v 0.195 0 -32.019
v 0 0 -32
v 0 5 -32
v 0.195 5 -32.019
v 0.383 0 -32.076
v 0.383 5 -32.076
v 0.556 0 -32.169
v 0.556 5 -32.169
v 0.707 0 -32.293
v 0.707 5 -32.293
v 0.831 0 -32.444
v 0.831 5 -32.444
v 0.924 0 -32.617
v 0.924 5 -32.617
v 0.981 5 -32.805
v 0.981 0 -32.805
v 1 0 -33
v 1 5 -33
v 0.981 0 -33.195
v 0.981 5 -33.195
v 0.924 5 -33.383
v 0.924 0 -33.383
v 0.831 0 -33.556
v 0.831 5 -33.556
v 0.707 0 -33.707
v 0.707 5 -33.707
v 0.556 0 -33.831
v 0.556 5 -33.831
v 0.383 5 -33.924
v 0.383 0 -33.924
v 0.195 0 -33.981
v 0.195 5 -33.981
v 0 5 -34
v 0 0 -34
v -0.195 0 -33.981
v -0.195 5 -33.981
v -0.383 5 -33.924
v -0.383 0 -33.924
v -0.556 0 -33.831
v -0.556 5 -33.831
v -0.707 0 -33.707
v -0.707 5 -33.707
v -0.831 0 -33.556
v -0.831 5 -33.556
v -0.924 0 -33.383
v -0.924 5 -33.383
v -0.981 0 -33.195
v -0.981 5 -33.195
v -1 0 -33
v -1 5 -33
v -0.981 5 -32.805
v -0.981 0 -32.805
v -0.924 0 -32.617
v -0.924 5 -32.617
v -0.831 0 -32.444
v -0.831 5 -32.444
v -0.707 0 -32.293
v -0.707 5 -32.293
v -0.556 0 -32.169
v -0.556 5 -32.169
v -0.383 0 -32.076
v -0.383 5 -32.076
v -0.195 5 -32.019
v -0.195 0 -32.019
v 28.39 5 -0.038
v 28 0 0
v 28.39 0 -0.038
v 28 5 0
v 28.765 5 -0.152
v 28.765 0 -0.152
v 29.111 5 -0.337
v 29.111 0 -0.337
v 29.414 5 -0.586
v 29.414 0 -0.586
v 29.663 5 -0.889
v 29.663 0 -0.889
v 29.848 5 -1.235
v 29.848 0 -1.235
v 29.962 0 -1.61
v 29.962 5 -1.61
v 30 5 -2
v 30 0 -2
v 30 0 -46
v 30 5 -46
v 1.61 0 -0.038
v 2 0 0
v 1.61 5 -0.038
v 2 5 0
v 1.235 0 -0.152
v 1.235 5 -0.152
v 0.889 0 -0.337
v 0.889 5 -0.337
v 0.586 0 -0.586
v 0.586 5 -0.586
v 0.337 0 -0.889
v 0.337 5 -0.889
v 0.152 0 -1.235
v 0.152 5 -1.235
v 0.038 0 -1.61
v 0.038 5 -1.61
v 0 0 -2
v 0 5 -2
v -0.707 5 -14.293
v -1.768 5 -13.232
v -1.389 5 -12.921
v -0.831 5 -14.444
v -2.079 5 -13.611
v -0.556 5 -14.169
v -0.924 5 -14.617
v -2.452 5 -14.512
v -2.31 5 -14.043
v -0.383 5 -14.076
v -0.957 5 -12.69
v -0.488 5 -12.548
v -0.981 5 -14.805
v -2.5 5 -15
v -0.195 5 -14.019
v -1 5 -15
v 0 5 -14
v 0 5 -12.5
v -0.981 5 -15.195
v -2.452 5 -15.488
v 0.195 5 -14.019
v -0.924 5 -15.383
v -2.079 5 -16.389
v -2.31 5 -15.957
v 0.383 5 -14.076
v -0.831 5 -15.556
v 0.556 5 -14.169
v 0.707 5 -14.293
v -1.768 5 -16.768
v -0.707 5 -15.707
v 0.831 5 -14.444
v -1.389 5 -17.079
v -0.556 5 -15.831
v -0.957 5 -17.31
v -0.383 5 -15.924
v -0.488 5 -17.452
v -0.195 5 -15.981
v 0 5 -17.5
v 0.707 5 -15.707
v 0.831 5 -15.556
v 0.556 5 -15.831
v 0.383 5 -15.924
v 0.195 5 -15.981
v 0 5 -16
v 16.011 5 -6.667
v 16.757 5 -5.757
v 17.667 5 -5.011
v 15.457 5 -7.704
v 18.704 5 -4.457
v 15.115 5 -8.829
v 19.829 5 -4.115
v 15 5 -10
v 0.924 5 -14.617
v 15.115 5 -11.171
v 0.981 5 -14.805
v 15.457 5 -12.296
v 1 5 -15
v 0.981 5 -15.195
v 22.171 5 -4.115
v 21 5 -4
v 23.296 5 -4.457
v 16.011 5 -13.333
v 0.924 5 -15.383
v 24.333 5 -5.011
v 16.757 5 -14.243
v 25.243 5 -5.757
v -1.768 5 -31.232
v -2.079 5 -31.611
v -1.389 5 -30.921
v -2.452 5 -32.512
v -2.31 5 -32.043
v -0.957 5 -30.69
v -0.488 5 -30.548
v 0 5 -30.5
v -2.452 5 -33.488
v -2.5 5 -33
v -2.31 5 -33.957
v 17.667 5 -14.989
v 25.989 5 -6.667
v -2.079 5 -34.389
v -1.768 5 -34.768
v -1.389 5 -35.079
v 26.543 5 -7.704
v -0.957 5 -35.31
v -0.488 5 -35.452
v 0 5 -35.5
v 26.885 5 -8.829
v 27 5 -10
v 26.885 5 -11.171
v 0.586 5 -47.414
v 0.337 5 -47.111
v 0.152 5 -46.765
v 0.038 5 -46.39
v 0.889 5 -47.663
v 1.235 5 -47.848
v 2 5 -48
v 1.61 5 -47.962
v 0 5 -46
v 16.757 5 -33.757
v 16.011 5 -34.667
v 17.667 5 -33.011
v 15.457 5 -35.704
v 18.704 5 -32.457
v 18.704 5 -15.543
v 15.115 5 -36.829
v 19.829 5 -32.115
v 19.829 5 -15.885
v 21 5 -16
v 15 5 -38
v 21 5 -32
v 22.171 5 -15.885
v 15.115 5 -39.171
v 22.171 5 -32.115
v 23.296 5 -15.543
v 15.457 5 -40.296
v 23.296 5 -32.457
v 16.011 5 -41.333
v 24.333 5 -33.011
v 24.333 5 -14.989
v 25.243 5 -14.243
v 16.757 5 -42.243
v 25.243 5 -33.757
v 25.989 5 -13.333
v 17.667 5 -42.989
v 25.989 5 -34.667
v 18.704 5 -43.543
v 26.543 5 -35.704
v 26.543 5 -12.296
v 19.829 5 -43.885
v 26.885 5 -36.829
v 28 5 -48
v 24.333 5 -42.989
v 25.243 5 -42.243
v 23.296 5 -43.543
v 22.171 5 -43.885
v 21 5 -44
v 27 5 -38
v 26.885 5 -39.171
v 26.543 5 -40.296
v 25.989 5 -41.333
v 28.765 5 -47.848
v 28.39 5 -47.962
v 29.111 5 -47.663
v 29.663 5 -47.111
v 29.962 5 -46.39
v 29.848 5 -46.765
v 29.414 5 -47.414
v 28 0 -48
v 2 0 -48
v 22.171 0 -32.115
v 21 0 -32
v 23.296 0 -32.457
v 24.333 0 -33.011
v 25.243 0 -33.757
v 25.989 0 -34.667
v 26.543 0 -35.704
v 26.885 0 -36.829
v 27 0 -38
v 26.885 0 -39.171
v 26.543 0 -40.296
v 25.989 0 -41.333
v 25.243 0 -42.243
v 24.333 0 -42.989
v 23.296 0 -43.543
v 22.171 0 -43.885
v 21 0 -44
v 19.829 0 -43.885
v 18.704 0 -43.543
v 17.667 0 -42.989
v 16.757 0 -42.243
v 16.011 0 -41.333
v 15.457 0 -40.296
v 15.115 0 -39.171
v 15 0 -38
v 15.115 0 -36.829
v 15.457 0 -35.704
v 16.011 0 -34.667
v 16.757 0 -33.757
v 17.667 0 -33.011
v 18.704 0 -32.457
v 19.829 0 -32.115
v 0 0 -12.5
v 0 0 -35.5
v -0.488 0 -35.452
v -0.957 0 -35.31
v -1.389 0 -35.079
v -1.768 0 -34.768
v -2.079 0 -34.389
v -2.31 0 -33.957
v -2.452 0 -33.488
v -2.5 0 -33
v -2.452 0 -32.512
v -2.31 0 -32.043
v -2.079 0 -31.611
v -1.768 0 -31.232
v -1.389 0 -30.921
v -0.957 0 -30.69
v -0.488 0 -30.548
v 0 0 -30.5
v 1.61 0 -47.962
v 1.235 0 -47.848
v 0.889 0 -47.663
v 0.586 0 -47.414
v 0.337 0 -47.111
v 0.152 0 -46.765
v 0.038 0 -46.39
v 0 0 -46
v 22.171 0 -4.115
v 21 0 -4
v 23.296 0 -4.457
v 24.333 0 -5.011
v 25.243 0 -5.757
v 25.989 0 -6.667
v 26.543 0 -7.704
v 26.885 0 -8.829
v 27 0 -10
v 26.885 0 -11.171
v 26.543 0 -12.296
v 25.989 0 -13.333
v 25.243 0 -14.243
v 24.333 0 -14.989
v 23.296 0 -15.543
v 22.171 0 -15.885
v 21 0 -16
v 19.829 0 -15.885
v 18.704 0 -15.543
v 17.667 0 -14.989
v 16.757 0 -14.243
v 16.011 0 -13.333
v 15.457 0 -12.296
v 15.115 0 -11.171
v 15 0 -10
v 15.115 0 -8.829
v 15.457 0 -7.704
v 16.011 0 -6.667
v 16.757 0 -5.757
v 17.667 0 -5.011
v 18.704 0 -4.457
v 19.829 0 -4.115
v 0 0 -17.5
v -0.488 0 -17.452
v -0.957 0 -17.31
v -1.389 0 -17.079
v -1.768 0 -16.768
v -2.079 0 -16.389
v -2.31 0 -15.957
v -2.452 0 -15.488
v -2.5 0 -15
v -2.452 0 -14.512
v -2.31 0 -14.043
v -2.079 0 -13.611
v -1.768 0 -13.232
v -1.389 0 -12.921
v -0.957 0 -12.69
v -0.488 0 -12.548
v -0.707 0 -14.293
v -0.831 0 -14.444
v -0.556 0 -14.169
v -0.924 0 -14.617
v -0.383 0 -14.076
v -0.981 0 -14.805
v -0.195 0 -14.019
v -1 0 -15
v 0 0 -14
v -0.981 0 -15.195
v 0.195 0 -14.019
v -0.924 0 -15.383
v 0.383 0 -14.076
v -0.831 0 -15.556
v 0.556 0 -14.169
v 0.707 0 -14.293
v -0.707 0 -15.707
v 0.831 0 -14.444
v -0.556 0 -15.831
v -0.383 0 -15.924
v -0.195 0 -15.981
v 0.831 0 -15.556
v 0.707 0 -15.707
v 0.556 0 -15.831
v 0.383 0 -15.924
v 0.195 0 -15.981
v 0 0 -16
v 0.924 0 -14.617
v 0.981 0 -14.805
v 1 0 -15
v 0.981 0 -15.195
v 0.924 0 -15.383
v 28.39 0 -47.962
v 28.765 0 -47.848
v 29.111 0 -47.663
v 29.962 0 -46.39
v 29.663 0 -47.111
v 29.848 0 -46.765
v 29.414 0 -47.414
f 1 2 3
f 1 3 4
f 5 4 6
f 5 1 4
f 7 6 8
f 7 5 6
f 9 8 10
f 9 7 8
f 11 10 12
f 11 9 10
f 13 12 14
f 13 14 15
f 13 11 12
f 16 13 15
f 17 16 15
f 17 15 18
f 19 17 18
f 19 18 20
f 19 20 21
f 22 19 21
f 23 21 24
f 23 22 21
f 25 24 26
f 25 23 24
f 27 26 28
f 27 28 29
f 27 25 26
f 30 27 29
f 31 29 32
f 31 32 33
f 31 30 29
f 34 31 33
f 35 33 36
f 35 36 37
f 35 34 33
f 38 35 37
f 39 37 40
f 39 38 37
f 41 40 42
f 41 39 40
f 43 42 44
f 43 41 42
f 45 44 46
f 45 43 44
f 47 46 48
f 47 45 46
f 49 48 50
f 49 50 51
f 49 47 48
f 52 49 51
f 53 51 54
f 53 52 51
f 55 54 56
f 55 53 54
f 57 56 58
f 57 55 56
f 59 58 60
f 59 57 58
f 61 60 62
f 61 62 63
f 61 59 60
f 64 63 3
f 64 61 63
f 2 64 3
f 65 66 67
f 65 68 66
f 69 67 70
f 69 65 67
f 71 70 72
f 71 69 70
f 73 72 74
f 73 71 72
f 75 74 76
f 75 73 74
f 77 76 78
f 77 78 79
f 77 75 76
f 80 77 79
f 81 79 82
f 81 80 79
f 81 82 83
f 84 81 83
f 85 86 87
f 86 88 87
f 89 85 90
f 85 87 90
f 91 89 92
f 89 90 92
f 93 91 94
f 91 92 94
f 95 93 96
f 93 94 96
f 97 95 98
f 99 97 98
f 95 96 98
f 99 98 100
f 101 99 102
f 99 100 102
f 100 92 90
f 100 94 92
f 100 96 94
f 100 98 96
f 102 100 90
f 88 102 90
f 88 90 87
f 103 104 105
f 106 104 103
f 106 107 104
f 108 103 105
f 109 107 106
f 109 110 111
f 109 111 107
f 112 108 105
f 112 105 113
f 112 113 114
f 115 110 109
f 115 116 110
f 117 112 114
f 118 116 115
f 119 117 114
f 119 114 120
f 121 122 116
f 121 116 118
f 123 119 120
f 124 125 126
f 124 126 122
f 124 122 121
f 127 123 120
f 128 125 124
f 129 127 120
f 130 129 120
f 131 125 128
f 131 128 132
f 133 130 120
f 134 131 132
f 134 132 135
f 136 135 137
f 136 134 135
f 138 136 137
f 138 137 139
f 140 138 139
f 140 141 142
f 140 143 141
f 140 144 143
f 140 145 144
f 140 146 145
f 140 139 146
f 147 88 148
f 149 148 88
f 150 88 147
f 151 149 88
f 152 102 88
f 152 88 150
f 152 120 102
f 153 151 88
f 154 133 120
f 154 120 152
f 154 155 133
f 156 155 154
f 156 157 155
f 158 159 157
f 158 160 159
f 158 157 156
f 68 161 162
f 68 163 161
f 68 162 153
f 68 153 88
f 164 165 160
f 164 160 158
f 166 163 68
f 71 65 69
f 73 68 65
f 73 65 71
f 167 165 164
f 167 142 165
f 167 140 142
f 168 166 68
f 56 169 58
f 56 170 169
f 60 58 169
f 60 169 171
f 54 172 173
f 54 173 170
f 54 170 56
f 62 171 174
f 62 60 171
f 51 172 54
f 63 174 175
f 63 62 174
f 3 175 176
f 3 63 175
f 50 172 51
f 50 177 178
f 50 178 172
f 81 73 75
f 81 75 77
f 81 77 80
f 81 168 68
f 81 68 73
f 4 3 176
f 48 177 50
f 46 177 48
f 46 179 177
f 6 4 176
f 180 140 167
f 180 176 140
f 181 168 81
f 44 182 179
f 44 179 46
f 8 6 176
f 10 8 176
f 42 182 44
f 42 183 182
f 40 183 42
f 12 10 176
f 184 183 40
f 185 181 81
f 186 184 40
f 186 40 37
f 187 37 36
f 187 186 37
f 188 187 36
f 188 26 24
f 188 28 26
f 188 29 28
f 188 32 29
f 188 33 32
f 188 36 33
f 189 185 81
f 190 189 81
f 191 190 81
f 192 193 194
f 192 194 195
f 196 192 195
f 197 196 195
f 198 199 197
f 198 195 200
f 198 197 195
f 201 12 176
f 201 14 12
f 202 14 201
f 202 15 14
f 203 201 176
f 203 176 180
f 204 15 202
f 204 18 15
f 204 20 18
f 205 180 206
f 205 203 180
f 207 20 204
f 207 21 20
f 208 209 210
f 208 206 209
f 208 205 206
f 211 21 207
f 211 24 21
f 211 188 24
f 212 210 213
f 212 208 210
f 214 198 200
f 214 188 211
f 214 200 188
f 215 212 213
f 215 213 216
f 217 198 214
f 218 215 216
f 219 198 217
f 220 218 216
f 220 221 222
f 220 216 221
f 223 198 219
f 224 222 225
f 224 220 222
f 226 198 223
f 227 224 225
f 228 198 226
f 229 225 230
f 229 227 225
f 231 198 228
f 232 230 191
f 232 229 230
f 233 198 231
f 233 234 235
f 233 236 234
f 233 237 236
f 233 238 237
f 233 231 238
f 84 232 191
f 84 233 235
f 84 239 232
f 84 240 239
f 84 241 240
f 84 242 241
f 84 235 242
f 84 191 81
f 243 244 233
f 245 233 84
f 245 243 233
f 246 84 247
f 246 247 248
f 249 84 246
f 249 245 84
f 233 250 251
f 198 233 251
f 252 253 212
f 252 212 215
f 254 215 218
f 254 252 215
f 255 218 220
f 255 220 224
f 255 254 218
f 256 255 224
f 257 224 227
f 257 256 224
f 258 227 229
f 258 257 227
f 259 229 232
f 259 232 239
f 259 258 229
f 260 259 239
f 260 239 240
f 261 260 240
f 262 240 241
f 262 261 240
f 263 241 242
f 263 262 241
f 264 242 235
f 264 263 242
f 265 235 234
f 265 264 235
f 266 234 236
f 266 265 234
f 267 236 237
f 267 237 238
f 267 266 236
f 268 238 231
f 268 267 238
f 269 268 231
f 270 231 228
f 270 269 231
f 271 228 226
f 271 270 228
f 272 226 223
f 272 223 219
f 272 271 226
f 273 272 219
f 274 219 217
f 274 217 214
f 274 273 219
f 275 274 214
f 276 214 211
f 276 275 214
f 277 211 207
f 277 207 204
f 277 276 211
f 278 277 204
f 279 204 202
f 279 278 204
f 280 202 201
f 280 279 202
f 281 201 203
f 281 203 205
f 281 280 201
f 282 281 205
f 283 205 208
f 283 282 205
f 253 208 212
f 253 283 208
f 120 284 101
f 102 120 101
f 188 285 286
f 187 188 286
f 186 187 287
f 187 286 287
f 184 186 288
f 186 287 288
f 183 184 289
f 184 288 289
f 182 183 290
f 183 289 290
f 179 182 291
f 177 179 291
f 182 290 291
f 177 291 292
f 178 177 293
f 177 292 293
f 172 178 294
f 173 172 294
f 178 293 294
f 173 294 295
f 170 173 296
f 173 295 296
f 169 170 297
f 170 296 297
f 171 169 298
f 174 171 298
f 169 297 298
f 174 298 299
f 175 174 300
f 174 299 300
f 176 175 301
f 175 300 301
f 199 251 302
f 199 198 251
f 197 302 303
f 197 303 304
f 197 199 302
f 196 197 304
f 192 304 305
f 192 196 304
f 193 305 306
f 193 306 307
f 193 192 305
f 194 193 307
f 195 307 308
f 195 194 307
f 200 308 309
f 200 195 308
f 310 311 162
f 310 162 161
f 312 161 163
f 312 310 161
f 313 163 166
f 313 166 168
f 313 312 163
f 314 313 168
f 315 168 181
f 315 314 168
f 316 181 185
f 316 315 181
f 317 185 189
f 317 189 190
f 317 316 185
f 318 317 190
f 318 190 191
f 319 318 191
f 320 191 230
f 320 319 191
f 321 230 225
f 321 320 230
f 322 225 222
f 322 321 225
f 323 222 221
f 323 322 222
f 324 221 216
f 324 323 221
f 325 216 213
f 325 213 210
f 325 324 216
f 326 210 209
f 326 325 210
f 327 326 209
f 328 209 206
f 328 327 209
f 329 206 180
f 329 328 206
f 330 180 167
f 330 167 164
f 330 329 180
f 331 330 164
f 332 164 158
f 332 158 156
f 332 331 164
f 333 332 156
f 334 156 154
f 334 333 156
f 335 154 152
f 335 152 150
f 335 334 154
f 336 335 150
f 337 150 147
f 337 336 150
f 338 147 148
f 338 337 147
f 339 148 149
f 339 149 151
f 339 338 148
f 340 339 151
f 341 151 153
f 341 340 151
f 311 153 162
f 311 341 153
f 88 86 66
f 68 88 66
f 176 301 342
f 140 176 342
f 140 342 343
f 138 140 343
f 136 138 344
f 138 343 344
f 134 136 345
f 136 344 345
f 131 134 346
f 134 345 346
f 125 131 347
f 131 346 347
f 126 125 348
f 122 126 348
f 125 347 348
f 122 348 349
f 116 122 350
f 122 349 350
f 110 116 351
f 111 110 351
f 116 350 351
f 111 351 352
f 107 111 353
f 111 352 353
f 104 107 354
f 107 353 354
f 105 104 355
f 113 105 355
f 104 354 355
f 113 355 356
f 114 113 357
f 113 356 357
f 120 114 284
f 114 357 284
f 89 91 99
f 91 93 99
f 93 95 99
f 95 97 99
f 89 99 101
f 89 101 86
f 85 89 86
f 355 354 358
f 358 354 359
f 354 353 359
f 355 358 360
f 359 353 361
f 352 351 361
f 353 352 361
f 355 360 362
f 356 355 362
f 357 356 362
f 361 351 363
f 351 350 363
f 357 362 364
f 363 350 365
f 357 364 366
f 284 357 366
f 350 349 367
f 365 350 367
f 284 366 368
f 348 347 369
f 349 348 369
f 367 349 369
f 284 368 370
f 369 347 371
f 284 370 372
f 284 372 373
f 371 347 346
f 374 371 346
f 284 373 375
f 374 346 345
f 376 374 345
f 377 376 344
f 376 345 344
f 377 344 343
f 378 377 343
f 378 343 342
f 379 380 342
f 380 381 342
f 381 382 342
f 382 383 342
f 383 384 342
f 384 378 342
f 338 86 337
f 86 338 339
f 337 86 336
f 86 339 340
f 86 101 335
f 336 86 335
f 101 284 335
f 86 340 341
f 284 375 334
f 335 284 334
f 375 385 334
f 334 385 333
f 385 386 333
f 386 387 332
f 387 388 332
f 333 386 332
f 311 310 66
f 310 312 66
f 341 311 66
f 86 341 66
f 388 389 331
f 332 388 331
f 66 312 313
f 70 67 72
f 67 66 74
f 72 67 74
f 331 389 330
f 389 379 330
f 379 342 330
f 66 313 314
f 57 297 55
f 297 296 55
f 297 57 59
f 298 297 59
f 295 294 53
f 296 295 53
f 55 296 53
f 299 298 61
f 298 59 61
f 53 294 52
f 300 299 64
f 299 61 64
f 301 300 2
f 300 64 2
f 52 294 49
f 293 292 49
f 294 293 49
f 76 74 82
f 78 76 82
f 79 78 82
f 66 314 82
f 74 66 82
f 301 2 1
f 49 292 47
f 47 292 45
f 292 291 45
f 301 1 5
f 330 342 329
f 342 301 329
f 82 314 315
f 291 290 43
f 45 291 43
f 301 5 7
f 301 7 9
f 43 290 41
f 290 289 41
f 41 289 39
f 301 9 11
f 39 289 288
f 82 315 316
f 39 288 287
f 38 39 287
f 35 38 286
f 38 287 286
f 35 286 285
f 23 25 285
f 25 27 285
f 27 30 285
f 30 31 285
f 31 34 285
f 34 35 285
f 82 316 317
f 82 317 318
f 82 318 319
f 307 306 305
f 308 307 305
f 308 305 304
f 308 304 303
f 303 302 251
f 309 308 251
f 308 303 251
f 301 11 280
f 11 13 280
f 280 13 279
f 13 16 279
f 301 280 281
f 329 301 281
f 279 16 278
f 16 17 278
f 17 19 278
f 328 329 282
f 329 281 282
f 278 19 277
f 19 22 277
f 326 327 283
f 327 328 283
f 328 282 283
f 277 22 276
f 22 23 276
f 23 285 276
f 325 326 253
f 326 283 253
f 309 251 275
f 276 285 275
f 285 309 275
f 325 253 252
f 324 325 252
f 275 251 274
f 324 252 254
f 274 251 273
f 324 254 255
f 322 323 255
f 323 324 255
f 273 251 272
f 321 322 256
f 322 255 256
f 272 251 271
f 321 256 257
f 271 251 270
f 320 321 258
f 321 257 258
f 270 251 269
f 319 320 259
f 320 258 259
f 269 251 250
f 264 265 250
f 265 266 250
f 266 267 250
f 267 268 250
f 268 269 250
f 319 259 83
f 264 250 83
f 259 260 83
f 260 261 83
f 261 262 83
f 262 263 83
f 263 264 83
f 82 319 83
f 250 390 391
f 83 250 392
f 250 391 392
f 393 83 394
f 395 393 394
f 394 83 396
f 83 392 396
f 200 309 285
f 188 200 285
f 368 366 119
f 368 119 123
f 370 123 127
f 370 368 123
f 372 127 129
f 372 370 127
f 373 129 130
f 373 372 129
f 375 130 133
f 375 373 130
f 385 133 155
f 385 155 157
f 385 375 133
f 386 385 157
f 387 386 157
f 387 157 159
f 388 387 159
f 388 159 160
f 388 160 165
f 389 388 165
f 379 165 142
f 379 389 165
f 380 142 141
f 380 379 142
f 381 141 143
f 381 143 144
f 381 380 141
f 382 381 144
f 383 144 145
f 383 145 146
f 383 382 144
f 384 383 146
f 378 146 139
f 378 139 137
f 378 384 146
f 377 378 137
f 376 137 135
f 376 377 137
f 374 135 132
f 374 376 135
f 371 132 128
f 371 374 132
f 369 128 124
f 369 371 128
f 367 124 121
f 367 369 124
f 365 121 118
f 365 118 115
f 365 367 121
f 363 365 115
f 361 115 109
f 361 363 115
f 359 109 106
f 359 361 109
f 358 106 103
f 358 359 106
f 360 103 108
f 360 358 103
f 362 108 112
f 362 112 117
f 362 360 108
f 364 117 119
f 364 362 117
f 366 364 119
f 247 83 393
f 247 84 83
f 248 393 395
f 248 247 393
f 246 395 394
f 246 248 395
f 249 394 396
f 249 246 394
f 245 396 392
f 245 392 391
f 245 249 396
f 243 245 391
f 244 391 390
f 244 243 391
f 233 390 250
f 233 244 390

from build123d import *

# Parameters (mm, degrees)
SKETCH1_R           = 6
SKETCH1_R_2         = 1
BOSS_EXTRUDE1_DEPTH = 5
FILLET2_R           = 2


with BuildPart() as part:
    # Sketch1 → Boss-Extrude1 (new body)
    with BuildSketch(Plane(origin=(0, 0, 0), x_dir=(1, 0, 0), z_dir=(0, 1, 0))):
        with BuildLine():
            Line((0, 0), (30, 0))
            Line((30, 0), (30, 48))
            Line((30, 48), (0, 48))
            Line((0, 48), (0, 35.5))
            ThreePointArc((0, 35.5), (-2.5, 33), (0, 30.5))
            Line((0, 30.5), (0, 17.5))
            ThreePointArc((0, 17.5), (-2.5, 15), (0, 12.5))
            Line((0, 12.5), (0, 0))
        make_face()
        with Locations(Location((21, 38, 0), (0, 0, 270))):
            Circle(SKETCH1_R, mode=Mode.SUBTRACT)
        with Locations(Location((21, 10, 0), (0, 0, 270))):
            Circle(SKETCH1_R, mode=Mode.SUBTRACT)
        with Locations(Location((0, 33, 0), (0, 0, 270))):
            Circle(SKETCH1_R_2, mode=Mode.SUBTRACT)
        with Locations(Location((0, 15, 0), (0, 0, 270))):
            Circle(SKETCH1_R_2, mode=Mode.SUBTRACT)
    extrude(amount=BOSS_EXTRUDE1_DEPTH)

    # Fillet2
    fillet2_edges = [part.edges().sort_by_distance(p)[0] for p in [
        (30, 2.5, 0),
        (0, 2.5, 0),
        (0, 2.5, -48),
        (30, 2.5, -48),
    ]]
    fillet(fillet2_edges, radius=FILLET2_R)


solid = part.part
